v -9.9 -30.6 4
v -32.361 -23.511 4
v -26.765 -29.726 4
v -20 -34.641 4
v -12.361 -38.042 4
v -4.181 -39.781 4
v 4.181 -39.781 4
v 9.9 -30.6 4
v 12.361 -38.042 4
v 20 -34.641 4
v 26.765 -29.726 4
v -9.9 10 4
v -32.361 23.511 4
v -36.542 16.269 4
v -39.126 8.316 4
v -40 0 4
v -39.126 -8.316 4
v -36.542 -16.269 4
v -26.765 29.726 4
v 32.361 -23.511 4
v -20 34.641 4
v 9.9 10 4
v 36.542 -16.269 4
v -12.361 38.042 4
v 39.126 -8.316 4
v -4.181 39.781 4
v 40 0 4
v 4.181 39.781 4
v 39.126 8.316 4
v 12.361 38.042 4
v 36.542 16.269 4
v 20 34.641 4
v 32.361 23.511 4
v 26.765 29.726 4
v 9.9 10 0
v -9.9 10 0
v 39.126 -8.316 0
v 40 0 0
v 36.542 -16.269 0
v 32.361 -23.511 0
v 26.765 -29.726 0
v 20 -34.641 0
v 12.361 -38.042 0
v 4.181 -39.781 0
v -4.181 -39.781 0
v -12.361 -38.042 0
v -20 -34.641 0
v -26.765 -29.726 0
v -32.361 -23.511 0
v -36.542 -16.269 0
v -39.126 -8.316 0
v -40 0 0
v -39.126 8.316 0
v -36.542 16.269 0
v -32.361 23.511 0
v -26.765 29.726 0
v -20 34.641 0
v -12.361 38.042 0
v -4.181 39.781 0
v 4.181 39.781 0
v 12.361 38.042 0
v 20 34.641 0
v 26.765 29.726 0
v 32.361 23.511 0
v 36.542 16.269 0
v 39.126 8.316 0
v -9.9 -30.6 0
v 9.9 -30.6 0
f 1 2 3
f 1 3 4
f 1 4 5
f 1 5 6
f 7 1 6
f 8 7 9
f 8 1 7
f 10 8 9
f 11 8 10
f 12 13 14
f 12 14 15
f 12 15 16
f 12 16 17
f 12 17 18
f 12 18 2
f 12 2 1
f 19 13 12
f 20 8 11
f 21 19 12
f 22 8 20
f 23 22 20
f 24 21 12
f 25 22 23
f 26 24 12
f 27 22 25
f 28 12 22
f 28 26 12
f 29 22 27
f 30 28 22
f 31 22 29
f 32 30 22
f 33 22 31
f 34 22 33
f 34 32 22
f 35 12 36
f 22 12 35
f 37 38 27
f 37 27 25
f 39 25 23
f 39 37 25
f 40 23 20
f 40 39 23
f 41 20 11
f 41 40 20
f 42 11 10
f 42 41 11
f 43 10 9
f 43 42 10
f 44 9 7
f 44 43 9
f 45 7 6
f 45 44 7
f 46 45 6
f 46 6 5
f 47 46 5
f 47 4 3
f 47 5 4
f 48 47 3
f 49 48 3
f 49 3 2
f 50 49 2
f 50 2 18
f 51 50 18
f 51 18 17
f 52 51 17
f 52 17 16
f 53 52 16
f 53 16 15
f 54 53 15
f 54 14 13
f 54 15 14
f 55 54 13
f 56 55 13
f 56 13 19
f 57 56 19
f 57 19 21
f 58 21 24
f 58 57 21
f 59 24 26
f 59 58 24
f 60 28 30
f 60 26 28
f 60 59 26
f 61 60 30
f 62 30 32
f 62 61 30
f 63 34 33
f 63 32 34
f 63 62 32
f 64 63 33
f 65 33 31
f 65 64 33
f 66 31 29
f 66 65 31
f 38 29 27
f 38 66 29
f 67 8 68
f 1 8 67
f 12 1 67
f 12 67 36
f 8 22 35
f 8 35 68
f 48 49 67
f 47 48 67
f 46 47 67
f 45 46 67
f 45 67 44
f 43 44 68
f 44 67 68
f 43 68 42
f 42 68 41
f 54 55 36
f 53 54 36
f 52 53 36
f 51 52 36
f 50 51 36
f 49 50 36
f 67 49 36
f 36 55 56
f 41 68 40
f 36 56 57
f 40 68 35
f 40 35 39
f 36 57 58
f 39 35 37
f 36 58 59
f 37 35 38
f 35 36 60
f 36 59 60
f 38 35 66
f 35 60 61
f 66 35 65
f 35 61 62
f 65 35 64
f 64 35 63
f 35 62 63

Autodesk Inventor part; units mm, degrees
ref_plane "YZ Plane" through (0, 0, 0) normal (1, 0, 0) x (0, 1, 0)
ref_plane "XZ Plane" through (0, 0, 0) normal (0, 1, 0) x (-1, 0, 0)
ref_plane "XY Plane" through (0, 0, 0) normal (0, 0, 1) x (1, 0, 0)
sketch "Sketch1" plane through (0, 0, 0) normal (0, 0, 1) x (1, 0, 0)
  circle A0 centre (0, 0) radius 40
  circle A1 centre (0, 0) radius 5.375
  dimension "d0" = 80
  dimension "d1" = 10.75
extrude "Extrusion1" add sketch "Sketch1" along normal blind 4
sketch "Sketch5" plane through (0, 0, 4) normal (0, 0, 1) x (1, 0, 0)
  point P0 (0, 0)
sketch "Sketch7" plane through (0, 0, 4) normal (0, 0, 1) x (1, 0, 0)
  line L0 (-9.9, 10) -> (9.9, 10)
  line L1 (9.9, 10) -> (9.9, -30.6)
  line L2 (9.9, -30.6) -> (-9.9, -30.6)
  line L3 (-9.9, -30.6) -> (-9.9, 10)
  circle A0 centre (0, 0) radius 5.375 projected
  dimension "d19" = 19.8
  dimension "d20" = 40.6
  dimension "d21" = 10
  dimension "d22" = 9.9
extrude "Extrusion5" cut sketch "Sketch7" against normal blind 4
properties part number "base22"
